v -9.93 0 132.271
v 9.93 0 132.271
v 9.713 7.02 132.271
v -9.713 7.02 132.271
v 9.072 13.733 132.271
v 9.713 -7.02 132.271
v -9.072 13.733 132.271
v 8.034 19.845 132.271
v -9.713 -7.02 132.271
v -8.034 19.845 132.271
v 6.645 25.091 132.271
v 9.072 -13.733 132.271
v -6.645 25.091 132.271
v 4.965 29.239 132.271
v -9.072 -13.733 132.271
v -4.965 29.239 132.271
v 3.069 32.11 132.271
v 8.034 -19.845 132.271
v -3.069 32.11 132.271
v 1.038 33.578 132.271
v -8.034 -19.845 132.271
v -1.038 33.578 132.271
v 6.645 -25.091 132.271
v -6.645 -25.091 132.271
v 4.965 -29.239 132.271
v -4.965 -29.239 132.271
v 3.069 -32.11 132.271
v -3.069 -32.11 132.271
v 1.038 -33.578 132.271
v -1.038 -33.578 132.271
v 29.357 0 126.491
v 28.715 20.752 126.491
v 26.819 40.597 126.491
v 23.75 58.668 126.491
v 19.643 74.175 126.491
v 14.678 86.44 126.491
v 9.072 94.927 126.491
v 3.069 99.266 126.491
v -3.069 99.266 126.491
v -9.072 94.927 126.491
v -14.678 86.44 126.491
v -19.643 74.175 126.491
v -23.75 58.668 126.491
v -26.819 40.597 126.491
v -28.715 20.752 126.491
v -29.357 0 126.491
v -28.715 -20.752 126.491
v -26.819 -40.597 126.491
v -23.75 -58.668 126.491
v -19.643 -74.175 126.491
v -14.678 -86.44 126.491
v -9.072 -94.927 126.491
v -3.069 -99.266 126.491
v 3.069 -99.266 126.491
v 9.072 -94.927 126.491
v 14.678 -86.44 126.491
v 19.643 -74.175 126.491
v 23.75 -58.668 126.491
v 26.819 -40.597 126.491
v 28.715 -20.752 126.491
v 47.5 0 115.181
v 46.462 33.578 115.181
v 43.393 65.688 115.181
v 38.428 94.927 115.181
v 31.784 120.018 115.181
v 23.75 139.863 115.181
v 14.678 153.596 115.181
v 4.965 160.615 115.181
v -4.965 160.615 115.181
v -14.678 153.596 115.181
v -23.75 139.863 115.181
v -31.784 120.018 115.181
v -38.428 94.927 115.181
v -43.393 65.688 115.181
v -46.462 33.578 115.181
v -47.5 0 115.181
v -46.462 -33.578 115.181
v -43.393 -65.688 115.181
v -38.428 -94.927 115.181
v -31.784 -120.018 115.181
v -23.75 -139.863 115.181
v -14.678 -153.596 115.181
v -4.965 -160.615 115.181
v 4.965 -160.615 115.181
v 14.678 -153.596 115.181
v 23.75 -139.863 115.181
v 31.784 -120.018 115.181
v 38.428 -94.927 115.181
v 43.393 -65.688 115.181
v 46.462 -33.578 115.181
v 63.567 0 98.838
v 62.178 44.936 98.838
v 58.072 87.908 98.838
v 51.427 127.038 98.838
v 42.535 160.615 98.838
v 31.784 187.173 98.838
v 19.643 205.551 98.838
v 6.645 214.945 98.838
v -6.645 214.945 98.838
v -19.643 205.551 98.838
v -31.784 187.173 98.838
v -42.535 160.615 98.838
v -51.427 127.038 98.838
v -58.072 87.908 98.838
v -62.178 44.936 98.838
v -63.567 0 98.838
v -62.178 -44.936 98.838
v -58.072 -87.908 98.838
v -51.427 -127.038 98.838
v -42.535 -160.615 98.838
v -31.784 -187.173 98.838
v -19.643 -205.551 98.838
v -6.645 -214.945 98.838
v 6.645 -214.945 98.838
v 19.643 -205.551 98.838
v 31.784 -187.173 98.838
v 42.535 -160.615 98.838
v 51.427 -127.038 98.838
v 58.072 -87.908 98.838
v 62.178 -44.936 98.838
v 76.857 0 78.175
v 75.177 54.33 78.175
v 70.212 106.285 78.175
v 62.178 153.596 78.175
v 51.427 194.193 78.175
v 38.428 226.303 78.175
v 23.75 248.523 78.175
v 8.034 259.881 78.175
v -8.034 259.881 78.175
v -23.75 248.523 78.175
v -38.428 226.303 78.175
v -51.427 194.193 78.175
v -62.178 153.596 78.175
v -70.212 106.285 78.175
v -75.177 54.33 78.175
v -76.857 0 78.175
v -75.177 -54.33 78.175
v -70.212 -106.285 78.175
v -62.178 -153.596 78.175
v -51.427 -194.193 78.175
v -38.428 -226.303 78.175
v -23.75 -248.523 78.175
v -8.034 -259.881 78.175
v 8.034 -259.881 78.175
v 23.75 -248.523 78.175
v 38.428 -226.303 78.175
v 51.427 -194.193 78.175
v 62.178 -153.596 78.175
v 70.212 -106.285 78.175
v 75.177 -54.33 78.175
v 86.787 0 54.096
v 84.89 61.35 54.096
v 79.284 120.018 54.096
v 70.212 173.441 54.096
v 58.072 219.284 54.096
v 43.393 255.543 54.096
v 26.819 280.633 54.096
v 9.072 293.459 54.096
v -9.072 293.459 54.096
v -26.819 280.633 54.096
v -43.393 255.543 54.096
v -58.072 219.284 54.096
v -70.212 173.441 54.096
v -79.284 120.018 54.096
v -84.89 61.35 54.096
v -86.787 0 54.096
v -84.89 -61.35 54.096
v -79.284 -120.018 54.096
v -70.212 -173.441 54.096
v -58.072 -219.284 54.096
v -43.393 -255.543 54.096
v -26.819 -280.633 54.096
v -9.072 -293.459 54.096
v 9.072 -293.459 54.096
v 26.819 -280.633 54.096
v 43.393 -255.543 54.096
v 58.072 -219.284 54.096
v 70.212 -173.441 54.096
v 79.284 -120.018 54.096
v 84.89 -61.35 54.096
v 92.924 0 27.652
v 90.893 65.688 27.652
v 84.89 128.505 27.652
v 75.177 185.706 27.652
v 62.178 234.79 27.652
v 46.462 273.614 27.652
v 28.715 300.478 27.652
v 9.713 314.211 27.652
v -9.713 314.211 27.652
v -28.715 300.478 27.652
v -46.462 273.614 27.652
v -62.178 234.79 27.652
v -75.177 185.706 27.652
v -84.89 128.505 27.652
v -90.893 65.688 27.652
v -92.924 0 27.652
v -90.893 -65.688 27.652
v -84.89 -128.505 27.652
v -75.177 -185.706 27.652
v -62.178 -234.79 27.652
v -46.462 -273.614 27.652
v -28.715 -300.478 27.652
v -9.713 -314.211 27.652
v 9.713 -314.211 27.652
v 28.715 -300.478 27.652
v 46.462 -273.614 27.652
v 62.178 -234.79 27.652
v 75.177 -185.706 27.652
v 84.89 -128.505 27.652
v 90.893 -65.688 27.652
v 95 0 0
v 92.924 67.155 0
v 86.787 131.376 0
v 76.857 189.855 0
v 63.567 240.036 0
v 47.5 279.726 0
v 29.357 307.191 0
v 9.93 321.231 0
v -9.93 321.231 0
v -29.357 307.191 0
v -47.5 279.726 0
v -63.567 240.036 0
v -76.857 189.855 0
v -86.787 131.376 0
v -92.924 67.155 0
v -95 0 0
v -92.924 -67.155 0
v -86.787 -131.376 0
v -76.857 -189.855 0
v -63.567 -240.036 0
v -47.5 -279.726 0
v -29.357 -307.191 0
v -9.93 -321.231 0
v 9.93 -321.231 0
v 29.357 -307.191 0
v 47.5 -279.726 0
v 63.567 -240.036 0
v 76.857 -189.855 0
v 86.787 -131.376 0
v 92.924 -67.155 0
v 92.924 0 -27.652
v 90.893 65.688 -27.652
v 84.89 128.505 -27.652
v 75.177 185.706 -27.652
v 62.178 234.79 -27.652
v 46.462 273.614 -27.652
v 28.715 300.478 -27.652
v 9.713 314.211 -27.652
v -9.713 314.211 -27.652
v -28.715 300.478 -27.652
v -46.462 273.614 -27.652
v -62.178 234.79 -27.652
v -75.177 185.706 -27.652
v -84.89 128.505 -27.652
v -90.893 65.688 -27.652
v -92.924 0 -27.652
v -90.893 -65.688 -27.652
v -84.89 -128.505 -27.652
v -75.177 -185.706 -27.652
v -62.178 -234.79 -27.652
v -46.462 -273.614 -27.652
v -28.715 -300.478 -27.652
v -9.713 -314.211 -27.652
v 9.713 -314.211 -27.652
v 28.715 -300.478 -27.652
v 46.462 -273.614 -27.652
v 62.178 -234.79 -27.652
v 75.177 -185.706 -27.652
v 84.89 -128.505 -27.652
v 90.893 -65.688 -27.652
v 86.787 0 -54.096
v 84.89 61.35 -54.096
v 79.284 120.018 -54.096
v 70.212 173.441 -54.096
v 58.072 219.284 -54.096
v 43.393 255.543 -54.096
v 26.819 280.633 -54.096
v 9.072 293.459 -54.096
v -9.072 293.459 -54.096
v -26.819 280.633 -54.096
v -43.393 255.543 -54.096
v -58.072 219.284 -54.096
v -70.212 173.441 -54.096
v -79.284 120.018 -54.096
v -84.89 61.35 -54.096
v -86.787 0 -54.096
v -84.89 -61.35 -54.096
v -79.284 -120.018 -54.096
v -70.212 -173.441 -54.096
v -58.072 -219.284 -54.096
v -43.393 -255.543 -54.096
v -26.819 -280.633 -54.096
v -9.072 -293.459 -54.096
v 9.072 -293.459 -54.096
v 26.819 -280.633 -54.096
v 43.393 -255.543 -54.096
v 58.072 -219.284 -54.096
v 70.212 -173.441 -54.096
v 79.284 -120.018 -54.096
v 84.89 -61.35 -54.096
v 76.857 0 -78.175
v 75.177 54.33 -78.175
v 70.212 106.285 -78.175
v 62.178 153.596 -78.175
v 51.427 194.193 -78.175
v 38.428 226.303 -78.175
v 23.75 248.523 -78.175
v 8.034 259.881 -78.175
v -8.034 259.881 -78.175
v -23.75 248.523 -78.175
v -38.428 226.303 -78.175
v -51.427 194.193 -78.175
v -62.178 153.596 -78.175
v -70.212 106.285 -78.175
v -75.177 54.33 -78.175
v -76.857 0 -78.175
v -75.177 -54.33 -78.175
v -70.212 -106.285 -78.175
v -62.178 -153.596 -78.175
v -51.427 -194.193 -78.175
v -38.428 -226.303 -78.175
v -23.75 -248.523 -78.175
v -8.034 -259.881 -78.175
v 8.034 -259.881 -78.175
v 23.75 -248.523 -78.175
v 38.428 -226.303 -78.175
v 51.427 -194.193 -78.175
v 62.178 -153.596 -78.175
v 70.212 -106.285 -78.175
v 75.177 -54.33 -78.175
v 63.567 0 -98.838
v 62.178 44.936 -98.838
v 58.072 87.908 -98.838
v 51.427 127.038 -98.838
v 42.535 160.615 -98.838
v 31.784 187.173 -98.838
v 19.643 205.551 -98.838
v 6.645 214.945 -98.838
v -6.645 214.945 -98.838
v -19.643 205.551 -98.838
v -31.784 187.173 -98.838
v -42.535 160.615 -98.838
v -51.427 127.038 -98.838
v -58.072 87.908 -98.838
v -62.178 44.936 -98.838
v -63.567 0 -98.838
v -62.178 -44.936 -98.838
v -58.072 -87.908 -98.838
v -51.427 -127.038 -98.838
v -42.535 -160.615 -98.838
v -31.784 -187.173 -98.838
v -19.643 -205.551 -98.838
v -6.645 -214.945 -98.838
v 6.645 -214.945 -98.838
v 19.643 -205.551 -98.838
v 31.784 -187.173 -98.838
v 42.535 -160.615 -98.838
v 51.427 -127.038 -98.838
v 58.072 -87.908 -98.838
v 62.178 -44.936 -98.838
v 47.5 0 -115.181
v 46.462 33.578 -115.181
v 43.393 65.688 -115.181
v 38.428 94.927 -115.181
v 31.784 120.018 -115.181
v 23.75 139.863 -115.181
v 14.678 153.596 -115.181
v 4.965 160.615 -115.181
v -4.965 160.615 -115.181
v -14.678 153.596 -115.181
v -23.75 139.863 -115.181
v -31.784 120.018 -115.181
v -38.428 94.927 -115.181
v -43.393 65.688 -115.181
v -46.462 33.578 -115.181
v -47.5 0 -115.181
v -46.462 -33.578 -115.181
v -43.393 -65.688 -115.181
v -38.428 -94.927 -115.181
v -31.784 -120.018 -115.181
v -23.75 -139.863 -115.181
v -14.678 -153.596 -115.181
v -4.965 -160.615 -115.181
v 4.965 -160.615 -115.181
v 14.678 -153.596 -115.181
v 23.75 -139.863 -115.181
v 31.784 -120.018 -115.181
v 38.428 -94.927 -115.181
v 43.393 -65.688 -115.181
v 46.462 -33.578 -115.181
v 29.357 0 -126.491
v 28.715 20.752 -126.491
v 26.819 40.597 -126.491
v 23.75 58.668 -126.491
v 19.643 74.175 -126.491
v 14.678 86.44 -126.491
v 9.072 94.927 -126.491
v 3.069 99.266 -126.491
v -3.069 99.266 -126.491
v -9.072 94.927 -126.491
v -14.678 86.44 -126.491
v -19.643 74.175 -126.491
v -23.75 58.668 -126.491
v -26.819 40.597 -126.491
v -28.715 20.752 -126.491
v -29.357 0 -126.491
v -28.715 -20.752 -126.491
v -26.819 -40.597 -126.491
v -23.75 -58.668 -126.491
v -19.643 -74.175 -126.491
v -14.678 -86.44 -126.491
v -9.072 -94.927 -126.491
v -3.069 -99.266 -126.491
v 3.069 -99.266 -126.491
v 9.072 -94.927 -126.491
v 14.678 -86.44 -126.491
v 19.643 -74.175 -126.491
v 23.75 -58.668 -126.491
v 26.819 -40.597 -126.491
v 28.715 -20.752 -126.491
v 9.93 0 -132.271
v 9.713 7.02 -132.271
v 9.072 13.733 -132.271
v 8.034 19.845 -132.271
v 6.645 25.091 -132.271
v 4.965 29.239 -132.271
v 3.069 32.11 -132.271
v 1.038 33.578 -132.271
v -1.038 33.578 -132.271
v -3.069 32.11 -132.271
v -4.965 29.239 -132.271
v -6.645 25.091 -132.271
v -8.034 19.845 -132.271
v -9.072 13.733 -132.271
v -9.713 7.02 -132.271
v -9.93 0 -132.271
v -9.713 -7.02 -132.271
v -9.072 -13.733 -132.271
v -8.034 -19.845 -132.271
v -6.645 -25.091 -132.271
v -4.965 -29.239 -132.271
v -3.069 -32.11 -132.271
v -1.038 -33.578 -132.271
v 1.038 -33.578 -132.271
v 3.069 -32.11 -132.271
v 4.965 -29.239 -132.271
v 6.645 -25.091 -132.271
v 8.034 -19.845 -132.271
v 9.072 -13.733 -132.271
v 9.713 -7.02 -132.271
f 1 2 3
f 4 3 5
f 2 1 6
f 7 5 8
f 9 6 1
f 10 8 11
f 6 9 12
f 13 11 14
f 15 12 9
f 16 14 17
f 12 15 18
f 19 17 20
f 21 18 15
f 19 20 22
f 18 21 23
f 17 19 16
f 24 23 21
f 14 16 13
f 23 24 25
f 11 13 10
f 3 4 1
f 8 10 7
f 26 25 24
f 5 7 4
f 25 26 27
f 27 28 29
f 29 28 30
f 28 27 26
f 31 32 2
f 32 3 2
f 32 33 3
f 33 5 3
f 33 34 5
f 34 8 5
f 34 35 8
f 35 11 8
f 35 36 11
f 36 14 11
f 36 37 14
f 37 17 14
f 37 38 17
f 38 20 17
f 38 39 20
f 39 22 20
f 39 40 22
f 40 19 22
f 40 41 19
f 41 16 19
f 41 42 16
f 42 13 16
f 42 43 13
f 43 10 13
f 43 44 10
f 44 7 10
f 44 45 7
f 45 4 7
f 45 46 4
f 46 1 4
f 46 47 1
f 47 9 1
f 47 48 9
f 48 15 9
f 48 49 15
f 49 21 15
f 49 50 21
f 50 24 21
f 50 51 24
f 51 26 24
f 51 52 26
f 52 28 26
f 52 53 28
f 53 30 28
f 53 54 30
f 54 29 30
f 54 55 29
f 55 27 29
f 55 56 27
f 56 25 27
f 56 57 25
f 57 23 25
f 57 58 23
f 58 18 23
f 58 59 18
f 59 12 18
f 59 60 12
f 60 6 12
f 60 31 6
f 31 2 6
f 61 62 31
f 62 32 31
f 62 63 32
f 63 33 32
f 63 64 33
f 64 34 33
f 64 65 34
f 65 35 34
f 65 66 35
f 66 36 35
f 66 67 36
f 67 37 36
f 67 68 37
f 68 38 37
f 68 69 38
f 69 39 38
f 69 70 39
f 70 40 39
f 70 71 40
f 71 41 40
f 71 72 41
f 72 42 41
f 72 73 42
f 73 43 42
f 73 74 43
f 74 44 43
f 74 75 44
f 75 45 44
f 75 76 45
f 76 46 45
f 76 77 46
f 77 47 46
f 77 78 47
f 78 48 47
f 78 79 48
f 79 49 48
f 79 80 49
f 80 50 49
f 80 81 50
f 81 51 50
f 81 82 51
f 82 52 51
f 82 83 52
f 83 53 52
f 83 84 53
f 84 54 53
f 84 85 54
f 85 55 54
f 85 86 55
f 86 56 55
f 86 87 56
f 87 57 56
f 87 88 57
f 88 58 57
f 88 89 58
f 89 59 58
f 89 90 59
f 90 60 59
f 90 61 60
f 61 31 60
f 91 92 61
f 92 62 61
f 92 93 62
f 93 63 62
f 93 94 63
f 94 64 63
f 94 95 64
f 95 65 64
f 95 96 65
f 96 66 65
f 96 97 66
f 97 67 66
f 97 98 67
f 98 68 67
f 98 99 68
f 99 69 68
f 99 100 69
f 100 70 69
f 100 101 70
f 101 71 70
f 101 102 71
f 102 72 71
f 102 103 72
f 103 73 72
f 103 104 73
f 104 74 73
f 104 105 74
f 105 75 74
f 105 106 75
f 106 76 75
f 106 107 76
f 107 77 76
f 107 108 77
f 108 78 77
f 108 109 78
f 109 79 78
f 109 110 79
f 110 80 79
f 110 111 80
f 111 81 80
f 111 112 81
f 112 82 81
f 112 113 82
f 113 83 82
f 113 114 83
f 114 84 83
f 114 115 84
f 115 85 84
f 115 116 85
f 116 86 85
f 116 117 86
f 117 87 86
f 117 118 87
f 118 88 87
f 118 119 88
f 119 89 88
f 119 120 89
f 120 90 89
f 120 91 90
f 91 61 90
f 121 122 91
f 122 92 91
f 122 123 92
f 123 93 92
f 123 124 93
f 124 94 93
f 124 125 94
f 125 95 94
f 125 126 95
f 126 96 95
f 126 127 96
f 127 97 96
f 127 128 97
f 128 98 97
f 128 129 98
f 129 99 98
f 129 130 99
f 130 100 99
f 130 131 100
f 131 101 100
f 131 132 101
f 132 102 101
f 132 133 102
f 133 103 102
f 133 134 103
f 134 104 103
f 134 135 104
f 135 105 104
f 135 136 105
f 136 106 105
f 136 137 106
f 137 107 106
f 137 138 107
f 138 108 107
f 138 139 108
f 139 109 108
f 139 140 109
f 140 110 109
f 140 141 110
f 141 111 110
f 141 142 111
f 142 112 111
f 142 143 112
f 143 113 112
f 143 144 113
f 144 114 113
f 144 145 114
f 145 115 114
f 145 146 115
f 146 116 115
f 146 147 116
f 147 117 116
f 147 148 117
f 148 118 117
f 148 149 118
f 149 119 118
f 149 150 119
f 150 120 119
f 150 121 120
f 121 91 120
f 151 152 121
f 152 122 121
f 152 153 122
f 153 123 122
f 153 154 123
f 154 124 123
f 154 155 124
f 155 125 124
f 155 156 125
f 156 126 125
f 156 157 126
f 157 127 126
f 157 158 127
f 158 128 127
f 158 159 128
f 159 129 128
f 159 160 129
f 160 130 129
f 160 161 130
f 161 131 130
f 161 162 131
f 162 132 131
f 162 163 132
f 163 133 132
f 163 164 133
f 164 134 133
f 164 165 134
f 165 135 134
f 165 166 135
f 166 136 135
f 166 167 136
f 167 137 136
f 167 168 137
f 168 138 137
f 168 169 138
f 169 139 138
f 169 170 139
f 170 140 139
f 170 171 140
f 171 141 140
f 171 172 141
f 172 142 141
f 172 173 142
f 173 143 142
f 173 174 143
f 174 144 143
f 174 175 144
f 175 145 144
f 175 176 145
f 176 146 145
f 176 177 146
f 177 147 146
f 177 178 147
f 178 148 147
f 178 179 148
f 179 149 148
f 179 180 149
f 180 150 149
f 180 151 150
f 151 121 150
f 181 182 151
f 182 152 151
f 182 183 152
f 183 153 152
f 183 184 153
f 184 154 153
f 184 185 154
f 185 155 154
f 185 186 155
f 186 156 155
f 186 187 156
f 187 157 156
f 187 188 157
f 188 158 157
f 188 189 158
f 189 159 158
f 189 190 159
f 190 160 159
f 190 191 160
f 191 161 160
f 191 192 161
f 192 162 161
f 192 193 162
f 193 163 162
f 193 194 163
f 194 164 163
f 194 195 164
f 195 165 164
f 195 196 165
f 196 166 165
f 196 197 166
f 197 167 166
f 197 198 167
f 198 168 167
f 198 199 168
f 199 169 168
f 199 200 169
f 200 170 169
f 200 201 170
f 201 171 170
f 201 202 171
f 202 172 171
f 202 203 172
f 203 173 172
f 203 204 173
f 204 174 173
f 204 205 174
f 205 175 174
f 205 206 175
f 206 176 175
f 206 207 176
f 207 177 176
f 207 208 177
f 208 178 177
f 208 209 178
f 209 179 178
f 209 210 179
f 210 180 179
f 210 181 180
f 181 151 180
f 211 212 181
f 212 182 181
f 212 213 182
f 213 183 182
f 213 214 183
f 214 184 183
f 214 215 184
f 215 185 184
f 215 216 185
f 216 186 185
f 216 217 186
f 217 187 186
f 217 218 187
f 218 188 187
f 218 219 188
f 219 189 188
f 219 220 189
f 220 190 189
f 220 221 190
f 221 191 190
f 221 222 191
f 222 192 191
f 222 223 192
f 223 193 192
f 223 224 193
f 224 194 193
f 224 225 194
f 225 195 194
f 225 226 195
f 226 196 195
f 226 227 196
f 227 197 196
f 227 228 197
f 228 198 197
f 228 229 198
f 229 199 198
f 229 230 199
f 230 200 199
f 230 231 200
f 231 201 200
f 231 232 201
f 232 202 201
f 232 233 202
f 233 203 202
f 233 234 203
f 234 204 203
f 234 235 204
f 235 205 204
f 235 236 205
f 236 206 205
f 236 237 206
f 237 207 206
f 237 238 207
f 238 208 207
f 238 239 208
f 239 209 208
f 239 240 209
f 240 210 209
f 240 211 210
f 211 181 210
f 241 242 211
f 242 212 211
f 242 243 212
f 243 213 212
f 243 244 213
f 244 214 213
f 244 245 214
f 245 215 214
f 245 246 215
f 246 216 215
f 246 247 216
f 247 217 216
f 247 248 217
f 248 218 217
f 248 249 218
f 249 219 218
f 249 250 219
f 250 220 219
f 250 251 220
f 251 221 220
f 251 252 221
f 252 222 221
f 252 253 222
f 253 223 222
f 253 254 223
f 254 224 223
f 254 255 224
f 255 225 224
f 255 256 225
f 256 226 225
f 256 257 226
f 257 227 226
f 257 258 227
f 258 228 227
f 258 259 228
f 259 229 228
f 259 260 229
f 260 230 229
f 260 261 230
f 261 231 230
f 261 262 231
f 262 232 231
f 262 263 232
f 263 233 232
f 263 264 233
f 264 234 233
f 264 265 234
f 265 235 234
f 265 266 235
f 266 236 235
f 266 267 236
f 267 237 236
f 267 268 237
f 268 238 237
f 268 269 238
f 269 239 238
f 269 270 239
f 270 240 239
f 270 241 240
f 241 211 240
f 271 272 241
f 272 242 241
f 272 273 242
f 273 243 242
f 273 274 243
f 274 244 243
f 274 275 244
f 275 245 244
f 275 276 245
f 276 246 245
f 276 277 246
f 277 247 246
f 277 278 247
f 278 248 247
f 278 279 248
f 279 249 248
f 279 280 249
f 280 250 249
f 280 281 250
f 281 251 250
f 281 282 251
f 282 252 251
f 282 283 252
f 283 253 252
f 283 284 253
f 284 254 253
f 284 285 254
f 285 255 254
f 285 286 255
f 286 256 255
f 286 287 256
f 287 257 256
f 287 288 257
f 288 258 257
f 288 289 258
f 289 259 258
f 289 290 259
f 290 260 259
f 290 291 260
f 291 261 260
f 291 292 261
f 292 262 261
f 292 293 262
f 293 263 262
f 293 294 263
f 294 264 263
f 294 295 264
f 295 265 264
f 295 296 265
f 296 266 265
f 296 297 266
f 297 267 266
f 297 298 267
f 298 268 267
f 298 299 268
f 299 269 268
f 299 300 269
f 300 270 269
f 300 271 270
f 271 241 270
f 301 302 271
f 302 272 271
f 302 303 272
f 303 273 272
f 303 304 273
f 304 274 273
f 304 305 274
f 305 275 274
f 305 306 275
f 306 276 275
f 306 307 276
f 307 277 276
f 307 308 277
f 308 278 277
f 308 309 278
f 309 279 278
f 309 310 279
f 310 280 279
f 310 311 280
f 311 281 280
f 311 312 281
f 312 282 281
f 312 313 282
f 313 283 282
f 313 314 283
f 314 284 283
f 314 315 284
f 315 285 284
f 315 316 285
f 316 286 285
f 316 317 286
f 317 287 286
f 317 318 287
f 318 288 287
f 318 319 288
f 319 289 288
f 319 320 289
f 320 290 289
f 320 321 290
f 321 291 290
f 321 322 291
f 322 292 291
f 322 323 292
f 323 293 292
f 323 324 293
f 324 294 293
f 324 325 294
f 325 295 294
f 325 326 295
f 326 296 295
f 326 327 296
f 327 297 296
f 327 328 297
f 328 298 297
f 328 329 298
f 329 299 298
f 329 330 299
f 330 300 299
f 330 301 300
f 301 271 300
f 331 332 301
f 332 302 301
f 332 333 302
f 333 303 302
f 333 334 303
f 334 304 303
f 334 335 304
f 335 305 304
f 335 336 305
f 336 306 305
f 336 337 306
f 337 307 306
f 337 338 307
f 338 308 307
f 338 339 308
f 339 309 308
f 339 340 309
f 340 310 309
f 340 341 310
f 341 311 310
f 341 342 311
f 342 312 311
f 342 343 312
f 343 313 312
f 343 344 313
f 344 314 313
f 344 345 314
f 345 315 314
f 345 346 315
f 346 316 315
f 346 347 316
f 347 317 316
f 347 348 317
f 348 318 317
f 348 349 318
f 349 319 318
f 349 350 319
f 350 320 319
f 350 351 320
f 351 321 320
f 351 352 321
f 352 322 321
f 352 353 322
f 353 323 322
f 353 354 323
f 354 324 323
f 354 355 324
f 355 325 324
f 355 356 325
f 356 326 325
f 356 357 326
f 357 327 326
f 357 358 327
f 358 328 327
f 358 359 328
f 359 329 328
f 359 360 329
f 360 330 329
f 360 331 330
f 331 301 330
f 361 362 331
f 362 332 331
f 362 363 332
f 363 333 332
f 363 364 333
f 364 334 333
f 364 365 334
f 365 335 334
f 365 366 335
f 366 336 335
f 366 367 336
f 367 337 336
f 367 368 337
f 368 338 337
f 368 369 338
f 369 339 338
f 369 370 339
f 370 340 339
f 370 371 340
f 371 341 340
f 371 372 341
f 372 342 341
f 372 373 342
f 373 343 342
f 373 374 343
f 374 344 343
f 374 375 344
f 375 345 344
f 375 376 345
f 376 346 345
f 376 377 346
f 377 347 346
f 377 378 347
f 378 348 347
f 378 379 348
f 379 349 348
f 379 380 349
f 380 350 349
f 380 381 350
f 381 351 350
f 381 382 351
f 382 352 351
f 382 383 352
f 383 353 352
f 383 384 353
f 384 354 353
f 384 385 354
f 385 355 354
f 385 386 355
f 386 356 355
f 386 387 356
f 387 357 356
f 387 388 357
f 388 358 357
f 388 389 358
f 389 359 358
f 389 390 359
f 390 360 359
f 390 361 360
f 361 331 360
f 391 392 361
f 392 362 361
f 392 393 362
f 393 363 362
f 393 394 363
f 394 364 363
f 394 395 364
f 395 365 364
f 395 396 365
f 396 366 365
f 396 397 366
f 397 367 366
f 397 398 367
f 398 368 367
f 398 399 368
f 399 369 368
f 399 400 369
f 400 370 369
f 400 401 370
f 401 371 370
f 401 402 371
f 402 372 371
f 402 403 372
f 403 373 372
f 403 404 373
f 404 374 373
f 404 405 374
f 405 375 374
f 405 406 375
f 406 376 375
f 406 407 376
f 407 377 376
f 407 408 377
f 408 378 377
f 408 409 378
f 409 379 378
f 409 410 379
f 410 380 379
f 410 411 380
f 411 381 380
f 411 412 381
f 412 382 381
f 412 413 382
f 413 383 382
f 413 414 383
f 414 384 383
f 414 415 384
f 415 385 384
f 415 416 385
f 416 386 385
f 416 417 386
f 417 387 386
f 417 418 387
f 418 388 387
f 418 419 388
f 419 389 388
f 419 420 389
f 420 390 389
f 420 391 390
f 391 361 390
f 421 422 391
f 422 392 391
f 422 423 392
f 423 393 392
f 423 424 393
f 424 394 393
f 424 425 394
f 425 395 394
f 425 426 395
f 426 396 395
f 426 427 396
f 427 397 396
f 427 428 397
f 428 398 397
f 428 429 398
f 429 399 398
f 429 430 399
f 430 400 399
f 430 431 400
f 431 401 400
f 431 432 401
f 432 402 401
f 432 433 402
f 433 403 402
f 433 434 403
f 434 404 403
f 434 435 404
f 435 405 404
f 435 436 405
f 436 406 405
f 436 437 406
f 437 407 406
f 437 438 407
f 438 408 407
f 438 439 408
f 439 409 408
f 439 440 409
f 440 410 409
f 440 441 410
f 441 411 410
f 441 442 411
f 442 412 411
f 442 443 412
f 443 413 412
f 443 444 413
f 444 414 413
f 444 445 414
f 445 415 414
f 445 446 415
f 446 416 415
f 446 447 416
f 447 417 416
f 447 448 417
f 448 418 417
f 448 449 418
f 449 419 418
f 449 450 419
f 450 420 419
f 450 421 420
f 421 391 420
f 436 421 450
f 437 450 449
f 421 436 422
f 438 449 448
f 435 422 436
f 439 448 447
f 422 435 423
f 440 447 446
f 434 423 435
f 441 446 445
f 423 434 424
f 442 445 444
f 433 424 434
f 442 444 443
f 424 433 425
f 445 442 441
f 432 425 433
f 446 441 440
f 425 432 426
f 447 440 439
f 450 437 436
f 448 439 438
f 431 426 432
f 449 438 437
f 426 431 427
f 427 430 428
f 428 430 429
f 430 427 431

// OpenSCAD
// Generated by SolidPython 1.0.1 on 2020-07-29 00:46:46


scale(v = [5, 17, 7]) {
	sphere(r = 19);
}
/***********************************************
*********      SolidPython code:      **********
************************************************
 
# import packages: SolidPython
from solid import *
from solid.utils import *
from itertools import chain, combinations, permutations


class Resize:

    def __init__(self, scad_file):
        self.scad_file = scad_file
        #self.scad_file = import_scad(scad_file)
        # cone/cylinder param:
        self.r1 = 0
        self.r2 = 0
        self.h = 0
        # rectangular prism param:
        self.w = 0
        self.l = 0
        # ellipse param:
        self.r = 0

    # import OpenScad code (file name corresponds to shape)


    # classify shape + parameters
    def assign(self, param1, param2, param3):
        if self.scad_file == 'cone.scad':
            self.r1 = param1
            self.r2 = param2
            self.h = param3
        elif self.scad_file == 'cylinder.scad':
            self.r1 = param1
            self.r2 = param2
            self.h = param3
        elif self.scad_file == 'rectangularPrism.scad':
            self.h = param1
            self.l = param2
            self.w = param3
        else:
            self.r = param1
            self.h = param2

    # resize parameters
    def iterate(self):
        x = range(3, 20, 2)
        i = 1
        if self.scad_file == 'cone.scad':
            tempList = list(permutations(x, 2))
            for temp in tempList:
                param1 = temp[0]
                param2 = temp[1]
                filepath = 'produced_scad_files/' + 'cone' + str(param1) + '_' + str(param2) + '_' + '.scad'
                scad_render_to_file(cylinder(h=param1, r1=param2, r2=0), filepath)

        elif self.scad_file == 'cylinder.scad':
            tempList = list(permutations(x, 3))
            for temp in tempList:
                param1 = temp[0]
                param2 = temp[1]
                filepath = 'produced_scad_files/' + 'cylinder' + str(param1) + '_' + str(param2) + '_' + '.scad'
                scad_render_to_file(cylinder(h=param1, r1=param2, r2=param2), filepath)

        elif self.scad_file == 'rectangularPrism.scad':
            tempList = list(permutations(x, 3))
            for temp in tempList:
                param1 = temp[0]
                param2 = temp[1]
                param3 = temp[2]
                filepath = 'produced_scad_files/' + 'rectangularPrism' + str(param1) + '_' + str(param2) + '_' + str(
                    param3) + '.scad'
                scad_render_to_file(cube(size=(param1, param2, param3)), filepath)

        elif self.scad_file == 'ellipse.scad':
            tempList = list(permutations(x, 4))
            for temp in tempList:
                param1 = temp[0]
                param2 = temp[1]
                param3 = temp[2]
                param4 = temp[3]
                filepath = 'produced_scad_files/' + 'ellipse' + str(param1) + '_' + str(param2) + '_' + str(param3) + '_' + str(param4) + '.scad'
                scad_render_to_file(scale([param1, param2, param3])(sphere(r=param4)), filepath)

    def render_to_scadfile(self):
        scad_render_to_file(scad, 'example.scad') 
 
************************************************/
